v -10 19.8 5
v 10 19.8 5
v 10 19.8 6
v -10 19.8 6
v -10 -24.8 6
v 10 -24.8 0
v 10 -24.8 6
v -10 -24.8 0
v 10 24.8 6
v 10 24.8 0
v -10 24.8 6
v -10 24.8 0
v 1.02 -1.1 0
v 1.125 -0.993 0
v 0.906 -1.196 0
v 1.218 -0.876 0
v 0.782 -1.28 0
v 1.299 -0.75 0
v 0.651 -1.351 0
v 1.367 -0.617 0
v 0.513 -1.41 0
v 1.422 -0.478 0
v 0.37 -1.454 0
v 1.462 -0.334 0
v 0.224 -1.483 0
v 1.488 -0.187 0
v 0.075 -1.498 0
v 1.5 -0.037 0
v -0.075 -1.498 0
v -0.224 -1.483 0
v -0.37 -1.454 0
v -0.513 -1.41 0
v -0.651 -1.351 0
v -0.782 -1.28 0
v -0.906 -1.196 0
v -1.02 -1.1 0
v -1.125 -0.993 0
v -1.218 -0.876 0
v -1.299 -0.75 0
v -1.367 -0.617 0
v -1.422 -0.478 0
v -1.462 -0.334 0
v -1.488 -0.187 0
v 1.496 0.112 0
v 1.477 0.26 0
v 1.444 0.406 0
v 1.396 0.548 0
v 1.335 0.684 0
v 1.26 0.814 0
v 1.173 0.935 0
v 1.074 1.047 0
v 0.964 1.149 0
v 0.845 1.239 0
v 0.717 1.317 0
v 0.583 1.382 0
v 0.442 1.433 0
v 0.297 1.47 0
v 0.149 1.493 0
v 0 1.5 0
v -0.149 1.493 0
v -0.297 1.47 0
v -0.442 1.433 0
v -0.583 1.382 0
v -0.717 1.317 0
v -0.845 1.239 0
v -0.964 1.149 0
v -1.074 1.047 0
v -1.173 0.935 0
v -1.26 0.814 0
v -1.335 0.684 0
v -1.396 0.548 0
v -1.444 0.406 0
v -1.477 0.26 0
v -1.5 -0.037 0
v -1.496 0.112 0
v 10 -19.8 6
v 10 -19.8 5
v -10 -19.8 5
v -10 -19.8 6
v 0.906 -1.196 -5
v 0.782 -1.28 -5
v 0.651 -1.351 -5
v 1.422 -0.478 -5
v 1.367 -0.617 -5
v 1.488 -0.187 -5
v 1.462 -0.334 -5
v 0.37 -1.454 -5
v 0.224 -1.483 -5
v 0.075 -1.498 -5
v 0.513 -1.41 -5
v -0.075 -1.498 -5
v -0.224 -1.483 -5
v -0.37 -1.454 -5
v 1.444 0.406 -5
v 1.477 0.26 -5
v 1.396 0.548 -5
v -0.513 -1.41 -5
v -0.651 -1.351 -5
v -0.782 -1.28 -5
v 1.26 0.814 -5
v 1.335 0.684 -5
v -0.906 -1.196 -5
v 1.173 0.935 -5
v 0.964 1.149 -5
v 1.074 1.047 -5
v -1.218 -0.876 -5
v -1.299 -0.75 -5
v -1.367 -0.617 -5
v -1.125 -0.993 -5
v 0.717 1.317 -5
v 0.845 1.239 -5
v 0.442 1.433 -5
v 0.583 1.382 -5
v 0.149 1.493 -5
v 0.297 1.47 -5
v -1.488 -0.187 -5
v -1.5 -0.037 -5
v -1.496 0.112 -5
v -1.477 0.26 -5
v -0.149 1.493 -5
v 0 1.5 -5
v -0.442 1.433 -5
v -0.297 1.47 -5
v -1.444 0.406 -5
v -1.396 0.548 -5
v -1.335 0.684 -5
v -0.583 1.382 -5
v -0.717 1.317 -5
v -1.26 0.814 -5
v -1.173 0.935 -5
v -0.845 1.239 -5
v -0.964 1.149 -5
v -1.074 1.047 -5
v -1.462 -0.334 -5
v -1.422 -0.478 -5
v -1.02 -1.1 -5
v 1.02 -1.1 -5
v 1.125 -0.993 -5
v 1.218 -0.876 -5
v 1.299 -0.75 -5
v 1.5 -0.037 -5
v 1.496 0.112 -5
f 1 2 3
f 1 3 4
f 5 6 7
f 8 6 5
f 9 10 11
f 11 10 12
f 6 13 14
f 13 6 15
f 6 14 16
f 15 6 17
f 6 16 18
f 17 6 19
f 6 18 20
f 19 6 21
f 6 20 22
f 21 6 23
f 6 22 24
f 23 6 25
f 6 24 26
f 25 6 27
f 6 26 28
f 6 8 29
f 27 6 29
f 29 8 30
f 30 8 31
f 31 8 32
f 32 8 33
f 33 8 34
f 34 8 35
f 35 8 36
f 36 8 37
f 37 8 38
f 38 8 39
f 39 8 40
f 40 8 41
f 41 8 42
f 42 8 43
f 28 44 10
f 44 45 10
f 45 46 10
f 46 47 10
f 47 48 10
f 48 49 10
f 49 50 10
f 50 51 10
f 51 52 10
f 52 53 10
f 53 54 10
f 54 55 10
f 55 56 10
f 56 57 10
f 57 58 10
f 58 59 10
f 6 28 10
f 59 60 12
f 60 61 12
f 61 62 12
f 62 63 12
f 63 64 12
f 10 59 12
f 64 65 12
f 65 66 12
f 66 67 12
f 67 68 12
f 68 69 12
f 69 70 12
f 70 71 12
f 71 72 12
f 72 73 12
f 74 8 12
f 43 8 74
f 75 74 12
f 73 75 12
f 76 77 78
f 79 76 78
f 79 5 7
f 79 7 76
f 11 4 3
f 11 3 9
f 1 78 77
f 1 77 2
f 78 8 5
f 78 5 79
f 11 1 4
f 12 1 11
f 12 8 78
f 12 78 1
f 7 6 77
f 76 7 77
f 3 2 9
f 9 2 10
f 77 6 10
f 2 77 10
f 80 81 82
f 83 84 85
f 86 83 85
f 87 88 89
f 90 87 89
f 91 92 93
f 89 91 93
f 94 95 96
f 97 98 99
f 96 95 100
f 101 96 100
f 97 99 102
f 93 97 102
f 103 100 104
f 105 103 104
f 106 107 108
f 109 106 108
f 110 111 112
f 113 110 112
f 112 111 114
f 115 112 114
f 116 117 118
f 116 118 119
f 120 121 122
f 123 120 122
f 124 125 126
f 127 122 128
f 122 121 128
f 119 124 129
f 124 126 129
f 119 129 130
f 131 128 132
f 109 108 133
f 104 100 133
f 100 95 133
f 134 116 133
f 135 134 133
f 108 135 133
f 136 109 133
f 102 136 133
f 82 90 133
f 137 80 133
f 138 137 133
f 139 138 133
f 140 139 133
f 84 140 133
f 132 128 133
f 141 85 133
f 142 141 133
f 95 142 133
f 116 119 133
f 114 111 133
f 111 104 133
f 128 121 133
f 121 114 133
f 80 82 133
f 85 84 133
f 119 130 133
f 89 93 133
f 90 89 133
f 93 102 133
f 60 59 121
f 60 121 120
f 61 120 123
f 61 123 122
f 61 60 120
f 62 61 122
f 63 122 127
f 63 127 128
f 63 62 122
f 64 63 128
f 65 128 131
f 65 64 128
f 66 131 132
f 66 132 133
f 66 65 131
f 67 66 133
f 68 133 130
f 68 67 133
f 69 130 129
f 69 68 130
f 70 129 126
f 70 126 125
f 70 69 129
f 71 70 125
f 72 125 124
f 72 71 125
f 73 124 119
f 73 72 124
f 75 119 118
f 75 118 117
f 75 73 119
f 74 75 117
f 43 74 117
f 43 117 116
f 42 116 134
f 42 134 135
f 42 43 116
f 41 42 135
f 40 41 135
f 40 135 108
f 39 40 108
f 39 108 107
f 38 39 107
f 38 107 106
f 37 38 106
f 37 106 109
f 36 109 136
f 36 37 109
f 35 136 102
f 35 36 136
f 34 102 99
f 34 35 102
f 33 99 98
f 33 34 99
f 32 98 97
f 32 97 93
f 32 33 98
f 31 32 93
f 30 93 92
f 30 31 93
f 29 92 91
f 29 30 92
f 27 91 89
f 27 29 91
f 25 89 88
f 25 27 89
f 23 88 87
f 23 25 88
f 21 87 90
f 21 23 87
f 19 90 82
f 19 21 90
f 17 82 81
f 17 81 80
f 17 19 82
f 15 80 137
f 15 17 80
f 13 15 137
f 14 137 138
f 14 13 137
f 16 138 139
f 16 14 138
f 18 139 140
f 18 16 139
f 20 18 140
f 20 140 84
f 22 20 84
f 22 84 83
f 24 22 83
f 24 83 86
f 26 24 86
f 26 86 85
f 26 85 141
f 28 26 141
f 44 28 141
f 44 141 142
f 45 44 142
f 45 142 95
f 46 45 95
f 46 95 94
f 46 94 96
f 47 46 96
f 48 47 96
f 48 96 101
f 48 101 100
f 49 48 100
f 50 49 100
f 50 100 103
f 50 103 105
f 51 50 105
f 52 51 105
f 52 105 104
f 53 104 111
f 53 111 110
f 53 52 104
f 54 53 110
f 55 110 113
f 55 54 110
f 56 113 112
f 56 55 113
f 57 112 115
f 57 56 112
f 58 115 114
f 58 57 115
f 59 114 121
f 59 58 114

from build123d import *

# Parameters (mm, degrees)
F0_R     = 1.5
F1_DEPTH = 5
F2_W     = 39.6
F2_H     = 20
F3_DEPTH = 5
F2_W_2   = 5
F4_DEPTH = 6
F5_ANGLE = 90


with BuildPart() as f1:
    # F0 (on Top) → F1 (new body)
    with BuildSketch(Plane.XY):
        Circle(F0_R)
    extrude(amount=-F1_DEPTH)

    # F2 (on Top) → F3 (join)
    with BuildSketch(Plane.XY):
        Rectangle(F2_W, F2_H)
    extrude(amount=F3_DEPTH)

    # F2 (on Top) → F4 (join)
    with BuildSketch(Plane.XY):
        with Locations((-22.3, 0)):
            Rectangle(F2_W_2, F2_H)
        with Locations((22.3, 0)):
            Rectangle(F2_W_2, F2_H)
    extrude(amount=F4_DEPTH)


with BuildPart() as f1_1:
    # F5: moved
    add(f1.part.rotate(Axis((0, 0, -5), (0, 0, 1)), F5_ANGLE))


solid = f1_1.part
